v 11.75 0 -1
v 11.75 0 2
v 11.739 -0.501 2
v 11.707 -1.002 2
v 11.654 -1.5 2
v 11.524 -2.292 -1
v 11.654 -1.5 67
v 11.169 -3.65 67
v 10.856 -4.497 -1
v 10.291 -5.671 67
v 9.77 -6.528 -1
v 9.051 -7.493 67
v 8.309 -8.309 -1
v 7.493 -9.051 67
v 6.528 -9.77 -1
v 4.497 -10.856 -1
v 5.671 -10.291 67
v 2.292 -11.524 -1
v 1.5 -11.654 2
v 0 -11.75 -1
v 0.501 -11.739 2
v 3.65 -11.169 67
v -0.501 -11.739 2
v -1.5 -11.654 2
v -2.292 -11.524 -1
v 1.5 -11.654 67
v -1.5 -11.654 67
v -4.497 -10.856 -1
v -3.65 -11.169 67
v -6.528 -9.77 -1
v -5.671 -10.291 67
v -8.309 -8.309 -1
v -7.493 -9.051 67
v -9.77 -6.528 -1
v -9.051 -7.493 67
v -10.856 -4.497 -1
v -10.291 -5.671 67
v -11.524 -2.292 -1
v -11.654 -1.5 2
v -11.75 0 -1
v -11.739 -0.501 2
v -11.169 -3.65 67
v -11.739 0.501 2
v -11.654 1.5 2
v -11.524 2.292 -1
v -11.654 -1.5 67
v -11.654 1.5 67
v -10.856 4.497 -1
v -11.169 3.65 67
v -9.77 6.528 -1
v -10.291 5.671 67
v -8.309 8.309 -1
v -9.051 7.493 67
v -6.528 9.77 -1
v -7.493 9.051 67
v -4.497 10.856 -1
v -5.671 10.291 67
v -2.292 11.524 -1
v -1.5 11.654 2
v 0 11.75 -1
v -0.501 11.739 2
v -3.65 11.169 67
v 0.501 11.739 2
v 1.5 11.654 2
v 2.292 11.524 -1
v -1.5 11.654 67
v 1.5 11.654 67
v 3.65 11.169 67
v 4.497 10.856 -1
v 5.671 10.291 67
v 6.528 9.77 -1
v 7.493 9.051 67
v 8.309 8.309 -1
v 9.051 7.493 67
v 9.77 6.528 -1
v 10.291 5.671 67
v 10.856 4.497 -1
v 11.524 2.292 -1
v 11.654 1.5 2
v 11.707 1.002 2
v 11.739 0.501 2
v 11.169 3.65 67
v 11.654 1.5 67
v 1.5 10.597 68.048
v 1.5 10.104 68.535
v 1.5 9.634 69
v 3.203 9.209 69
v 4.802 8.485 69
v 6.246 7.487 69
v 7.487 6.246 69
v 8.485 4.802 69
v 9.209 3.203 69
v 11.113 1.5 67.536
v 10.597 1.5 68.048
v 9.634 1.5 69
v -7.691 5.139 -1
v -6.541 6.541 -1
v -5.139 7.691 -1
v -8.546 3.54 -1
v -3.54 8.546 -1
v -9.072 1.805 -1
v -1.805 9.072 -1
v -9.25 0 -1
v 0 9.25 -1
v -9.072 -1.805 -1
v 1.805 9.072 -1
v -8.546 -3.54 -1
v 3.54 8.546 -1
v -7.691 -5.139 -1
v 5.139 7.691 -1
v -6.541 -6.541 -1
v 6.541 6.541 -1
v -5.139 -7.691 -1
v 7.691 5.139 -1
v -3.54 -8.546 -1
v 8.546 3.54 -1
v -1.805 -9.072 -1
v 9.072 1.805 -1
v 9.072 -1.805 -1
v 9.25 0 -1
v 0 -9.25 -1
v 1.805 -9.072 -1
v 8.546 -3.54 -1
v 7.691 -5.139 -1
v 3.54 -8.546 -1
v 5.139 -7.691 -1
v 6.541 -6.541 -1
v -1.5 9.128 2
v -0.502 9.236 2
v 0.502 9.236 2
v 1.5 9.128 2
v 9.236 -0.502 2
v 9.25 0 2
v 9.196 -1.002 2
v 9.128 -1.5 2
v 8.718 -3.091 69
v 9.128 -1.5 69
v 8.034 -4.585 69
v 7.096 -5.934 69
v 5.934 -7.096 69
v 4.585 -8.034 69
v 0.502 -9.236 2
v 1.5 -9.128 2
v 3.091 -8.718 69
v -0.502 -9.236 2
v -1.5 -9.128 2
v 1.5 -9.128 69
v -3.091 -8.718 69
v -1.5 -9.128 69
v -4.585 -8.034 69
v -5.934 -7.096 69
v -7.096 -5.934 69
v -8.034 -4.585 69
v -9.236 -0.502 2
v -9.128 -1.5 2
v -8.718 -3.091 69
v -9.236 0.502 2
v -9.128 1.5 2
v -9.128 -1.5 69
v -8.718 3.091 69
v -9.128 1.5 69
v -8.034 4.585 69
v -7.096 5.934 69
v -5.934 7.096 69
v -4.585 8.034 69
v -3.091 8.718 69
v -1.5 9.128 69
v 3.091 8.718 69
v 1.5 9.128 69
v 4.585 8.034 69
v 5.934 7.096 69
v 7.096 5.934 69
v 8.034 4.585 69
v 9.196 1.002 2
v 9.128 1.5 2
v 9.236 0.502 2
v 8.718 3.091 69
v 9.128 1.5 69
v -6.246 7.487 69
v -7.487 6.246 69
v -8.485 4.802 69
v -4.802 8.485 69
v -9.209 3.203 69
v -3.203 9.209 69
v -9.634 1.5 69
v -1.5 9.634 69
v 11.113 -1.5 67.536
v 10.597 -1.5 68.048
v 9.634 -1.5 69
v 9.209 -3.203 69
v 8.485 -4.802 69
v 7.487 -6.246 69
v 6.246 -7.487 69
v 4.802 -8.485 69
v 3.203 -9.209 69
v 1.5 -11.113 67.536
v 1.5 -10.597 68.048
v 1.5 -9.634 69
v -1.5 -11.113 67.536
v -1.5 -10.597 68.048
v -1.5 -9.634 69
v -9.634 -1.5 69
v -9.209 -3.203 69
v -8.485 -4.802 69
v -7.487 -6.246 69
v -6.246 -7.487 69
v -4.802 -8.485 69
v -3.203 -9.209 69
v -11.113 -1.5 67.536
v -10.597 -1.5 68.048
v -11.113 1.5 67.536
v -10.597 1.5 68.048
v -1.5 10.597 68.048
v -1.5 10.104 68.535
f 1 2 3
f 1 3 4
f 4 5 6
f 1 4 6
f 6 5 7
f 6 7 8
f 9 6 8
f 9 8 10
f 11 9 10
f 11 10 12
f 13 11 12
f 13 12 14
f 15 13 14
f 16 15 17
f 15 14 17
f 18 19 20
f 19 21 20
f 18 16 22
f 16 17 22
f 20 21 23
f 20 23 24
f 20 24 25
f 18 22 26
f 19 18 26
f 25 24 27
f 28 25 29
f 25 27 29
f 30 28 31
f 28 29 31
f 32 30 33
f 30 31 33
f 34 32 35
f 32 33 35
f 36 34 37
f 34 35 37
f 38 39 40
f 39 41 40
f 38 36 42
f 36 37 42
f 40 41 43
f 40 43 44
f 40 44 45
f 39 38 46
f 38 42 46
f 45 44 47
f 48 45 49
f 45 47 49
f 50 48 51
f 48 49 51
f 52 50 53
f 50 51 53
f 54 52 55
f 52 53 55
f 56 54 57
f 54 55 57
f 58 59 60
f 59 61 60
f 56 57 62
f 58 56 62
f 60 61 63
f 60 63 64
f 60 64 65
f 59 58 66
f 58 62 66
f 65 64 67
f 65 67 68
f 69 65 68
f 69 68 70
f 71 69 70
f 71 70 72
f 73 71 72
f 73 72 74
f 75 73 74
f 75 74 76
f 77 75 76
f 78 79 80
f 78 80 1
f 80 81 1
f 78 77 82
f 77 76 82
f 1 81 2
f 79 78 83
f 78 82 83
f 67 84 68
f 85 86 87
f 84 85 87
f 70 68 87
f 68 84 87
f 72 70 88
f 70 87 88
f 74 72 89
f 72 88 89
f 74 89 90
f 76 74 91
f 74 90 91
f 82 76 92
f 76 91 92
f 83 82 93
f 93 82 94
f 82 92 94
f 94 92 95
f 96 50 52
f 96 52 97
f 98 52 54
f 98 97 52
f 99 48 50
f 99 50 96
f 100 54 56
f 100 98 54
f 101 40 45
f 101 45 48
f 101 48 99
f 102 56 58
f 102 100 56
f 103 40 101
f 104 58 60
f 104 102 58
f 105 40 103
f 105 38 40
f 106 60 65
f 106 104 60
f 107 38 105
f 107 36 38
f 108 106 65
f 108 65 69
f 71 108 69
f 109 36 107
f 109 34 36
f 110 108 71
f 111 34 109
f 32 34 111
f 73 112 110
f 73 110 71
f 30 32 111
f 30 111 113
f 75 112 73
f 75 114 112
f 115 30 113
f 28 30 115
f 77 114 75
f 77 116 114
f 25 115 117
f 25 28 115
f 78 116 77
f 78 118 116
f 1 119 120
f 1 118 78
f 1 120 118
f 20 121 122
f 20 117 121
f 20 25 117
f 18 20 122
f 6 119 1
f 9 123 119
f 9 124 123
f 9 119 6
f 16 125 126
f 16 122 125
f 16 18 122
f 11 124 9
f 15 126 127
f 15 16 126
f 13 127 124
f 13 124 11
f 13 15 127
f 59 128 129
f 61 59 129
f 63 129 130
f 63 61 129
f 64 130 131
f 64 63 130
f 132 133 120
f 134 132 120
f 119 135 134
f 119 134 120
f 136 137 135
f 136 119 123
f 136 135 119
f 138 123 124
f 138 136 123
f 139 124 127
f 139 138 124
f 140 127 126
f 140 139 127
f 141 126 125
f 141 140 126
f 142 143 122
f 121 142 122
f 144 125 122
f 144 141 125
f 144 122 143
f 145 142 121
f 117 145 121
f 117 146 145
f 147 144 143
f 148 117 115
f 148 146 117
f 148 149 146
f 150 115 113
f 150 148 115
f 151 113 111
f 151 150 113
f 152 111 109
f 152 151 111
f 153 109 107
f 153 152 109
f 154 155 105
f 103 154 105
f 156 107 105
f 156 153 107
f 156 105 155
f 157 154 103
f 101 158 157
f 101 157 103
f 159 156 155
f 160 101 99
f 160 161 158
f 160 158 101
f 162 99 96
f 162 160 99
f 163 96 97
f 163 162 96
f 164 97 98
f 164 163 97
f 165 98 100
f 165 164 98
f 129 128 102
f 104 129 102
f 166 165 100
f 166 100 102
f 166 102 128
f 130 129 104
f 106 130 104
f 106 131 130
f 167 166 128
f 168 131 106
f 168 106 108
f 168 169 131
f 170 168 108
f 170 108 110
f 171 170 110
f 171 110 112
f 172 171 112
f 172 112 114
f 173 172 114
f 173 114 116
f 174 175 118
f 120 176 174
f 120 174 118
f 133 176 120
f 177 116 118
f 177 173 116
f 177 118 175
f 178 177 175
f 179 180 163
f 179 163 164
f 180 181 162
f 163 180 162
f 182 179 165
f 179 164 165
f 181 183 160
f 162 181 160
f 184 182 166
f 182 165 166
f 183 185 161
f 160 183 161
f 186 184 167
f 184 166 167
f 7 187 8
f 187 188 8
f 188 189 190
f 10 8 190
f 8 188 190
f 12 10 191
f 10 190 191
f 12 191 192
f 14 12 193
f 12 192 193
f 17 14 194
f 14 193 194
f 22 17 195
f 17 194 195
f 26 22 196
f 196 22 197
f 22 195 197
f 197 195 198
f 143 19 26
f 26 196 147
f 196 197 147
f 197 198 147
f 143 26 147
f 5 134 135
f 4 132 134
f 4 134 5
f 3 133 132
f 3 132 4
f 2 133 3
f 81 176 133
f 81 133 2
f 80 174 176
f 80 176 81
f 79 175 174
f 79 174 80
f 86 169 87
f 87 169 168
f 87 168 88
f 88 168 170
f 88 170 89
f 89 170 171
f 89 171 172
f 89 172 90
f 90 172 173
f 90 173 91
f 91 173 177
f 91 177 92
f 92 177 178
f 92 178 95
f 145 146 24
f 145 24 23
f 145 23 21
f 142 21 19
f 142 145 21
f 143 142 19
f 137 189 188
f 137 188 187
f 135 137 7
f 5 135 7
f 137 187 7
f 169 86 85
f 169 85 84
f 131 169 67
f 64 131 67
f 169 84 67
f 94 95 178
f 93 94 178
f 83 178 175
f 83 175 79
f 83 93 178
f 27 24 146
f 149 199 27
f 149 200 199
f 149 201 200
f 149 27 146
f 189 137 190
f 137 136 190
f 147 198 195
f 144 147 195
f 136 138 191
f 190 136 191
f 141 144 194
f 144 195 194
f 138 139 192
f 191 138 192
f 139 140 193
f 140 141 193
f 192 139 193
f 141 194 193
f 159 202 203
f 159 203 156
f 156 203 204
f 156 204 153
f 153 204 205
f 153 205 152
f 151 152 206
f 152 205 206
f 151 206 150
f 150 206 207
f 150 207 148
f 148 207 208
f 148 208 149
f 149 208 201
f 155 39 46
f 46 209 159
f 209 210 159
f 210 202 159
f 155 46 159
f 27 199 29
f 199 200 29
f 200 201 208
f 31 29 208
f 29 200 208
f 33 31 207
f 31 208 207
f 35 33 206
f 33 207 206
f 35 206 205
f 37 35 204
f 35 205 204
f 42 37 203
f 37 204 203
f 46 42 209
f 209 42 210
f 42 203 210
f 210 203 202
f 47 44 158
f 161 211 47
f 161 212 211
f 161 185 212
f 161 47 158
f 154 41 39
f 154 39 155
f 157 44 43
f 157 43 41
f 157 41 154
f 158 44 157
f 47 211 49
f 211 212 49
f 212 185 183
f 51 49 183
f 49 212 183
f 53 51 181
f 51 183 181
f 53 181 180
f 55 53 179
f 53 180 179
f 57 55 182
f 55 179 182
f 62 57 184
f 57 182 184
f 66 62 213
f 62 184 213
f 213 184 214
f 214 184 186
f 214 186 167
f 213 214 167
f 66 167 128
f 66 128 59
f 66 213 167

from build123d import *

# Parameters (mm, degrees)
SKETCH020_R             = 11.75
SKETCH020_R_2           = 9.25
PAD014_DEPTH            = 70
SKETCH021_W             = 31.48
SKETCH021_H             = 3
POCKET004_DEPTH         = 67
CHAMFER005_SIZE         = 2
SKETCH022_W             = 3
SKETCH022_H             = 31.59
POCKET005_DEPTH         = 67
BODY012_PLACEMENT_ANGLE = 180


with BuildPart() as part:
    # Sketch020 → Pad014 (new body)
    with BuildSketch(Plane.XY):
        Circle(SKETCH020_R)
        Circle(SKETCH020_R_2, mode=Mode.SUBTRACT)
    extrude(amount=PAD014_DEPTH)

    # Sketch021 (on Face3 of Pad014) → Pocket004 (cut)
    with BuildSketch(Plane(origin=(0, 0, 0), x_dir=(1, 0, 0), z_dir=(0, 0, -1))):
        Rectangle(SKETCH021_W, SKETCH021_H)
    extrude(amount=-POCKET004_DEPTH, mode=Mode.SUBTRACT)

    # Chamfer005
    chamfer005_edges = [part.edges().sort_by_distance(p)[0] for p in [
        (0, 11.75, 0),
        (0, -11.75, 0),
    ]]
    chamfer(chamfer005_edges, length=CHAMFER005_SIZE)

    # Sketch022 (on Face11 of Chamfer005) → Pocket005 (cut)
    with BuildSketch(Plane(origin=(0, 0, 0), x_dir=(1, 0, 0), z_dir=(0, 0, -1))):
        Rectangle(SKETCH022_W, SKETCH022_H)
    extrude(amount=-POCKET005_DEPTH, mode=Mode.SUBTRACT)


with BuildPart() as part_1:
    # Body012 placement: moved
    add(part.part.moved(Location((0, 0, 69))).rotate(Axis((0, 0, 69), (1, 0, 0)), BODY012_PLACEMENT_ANGLE))


solid = part_1.part
